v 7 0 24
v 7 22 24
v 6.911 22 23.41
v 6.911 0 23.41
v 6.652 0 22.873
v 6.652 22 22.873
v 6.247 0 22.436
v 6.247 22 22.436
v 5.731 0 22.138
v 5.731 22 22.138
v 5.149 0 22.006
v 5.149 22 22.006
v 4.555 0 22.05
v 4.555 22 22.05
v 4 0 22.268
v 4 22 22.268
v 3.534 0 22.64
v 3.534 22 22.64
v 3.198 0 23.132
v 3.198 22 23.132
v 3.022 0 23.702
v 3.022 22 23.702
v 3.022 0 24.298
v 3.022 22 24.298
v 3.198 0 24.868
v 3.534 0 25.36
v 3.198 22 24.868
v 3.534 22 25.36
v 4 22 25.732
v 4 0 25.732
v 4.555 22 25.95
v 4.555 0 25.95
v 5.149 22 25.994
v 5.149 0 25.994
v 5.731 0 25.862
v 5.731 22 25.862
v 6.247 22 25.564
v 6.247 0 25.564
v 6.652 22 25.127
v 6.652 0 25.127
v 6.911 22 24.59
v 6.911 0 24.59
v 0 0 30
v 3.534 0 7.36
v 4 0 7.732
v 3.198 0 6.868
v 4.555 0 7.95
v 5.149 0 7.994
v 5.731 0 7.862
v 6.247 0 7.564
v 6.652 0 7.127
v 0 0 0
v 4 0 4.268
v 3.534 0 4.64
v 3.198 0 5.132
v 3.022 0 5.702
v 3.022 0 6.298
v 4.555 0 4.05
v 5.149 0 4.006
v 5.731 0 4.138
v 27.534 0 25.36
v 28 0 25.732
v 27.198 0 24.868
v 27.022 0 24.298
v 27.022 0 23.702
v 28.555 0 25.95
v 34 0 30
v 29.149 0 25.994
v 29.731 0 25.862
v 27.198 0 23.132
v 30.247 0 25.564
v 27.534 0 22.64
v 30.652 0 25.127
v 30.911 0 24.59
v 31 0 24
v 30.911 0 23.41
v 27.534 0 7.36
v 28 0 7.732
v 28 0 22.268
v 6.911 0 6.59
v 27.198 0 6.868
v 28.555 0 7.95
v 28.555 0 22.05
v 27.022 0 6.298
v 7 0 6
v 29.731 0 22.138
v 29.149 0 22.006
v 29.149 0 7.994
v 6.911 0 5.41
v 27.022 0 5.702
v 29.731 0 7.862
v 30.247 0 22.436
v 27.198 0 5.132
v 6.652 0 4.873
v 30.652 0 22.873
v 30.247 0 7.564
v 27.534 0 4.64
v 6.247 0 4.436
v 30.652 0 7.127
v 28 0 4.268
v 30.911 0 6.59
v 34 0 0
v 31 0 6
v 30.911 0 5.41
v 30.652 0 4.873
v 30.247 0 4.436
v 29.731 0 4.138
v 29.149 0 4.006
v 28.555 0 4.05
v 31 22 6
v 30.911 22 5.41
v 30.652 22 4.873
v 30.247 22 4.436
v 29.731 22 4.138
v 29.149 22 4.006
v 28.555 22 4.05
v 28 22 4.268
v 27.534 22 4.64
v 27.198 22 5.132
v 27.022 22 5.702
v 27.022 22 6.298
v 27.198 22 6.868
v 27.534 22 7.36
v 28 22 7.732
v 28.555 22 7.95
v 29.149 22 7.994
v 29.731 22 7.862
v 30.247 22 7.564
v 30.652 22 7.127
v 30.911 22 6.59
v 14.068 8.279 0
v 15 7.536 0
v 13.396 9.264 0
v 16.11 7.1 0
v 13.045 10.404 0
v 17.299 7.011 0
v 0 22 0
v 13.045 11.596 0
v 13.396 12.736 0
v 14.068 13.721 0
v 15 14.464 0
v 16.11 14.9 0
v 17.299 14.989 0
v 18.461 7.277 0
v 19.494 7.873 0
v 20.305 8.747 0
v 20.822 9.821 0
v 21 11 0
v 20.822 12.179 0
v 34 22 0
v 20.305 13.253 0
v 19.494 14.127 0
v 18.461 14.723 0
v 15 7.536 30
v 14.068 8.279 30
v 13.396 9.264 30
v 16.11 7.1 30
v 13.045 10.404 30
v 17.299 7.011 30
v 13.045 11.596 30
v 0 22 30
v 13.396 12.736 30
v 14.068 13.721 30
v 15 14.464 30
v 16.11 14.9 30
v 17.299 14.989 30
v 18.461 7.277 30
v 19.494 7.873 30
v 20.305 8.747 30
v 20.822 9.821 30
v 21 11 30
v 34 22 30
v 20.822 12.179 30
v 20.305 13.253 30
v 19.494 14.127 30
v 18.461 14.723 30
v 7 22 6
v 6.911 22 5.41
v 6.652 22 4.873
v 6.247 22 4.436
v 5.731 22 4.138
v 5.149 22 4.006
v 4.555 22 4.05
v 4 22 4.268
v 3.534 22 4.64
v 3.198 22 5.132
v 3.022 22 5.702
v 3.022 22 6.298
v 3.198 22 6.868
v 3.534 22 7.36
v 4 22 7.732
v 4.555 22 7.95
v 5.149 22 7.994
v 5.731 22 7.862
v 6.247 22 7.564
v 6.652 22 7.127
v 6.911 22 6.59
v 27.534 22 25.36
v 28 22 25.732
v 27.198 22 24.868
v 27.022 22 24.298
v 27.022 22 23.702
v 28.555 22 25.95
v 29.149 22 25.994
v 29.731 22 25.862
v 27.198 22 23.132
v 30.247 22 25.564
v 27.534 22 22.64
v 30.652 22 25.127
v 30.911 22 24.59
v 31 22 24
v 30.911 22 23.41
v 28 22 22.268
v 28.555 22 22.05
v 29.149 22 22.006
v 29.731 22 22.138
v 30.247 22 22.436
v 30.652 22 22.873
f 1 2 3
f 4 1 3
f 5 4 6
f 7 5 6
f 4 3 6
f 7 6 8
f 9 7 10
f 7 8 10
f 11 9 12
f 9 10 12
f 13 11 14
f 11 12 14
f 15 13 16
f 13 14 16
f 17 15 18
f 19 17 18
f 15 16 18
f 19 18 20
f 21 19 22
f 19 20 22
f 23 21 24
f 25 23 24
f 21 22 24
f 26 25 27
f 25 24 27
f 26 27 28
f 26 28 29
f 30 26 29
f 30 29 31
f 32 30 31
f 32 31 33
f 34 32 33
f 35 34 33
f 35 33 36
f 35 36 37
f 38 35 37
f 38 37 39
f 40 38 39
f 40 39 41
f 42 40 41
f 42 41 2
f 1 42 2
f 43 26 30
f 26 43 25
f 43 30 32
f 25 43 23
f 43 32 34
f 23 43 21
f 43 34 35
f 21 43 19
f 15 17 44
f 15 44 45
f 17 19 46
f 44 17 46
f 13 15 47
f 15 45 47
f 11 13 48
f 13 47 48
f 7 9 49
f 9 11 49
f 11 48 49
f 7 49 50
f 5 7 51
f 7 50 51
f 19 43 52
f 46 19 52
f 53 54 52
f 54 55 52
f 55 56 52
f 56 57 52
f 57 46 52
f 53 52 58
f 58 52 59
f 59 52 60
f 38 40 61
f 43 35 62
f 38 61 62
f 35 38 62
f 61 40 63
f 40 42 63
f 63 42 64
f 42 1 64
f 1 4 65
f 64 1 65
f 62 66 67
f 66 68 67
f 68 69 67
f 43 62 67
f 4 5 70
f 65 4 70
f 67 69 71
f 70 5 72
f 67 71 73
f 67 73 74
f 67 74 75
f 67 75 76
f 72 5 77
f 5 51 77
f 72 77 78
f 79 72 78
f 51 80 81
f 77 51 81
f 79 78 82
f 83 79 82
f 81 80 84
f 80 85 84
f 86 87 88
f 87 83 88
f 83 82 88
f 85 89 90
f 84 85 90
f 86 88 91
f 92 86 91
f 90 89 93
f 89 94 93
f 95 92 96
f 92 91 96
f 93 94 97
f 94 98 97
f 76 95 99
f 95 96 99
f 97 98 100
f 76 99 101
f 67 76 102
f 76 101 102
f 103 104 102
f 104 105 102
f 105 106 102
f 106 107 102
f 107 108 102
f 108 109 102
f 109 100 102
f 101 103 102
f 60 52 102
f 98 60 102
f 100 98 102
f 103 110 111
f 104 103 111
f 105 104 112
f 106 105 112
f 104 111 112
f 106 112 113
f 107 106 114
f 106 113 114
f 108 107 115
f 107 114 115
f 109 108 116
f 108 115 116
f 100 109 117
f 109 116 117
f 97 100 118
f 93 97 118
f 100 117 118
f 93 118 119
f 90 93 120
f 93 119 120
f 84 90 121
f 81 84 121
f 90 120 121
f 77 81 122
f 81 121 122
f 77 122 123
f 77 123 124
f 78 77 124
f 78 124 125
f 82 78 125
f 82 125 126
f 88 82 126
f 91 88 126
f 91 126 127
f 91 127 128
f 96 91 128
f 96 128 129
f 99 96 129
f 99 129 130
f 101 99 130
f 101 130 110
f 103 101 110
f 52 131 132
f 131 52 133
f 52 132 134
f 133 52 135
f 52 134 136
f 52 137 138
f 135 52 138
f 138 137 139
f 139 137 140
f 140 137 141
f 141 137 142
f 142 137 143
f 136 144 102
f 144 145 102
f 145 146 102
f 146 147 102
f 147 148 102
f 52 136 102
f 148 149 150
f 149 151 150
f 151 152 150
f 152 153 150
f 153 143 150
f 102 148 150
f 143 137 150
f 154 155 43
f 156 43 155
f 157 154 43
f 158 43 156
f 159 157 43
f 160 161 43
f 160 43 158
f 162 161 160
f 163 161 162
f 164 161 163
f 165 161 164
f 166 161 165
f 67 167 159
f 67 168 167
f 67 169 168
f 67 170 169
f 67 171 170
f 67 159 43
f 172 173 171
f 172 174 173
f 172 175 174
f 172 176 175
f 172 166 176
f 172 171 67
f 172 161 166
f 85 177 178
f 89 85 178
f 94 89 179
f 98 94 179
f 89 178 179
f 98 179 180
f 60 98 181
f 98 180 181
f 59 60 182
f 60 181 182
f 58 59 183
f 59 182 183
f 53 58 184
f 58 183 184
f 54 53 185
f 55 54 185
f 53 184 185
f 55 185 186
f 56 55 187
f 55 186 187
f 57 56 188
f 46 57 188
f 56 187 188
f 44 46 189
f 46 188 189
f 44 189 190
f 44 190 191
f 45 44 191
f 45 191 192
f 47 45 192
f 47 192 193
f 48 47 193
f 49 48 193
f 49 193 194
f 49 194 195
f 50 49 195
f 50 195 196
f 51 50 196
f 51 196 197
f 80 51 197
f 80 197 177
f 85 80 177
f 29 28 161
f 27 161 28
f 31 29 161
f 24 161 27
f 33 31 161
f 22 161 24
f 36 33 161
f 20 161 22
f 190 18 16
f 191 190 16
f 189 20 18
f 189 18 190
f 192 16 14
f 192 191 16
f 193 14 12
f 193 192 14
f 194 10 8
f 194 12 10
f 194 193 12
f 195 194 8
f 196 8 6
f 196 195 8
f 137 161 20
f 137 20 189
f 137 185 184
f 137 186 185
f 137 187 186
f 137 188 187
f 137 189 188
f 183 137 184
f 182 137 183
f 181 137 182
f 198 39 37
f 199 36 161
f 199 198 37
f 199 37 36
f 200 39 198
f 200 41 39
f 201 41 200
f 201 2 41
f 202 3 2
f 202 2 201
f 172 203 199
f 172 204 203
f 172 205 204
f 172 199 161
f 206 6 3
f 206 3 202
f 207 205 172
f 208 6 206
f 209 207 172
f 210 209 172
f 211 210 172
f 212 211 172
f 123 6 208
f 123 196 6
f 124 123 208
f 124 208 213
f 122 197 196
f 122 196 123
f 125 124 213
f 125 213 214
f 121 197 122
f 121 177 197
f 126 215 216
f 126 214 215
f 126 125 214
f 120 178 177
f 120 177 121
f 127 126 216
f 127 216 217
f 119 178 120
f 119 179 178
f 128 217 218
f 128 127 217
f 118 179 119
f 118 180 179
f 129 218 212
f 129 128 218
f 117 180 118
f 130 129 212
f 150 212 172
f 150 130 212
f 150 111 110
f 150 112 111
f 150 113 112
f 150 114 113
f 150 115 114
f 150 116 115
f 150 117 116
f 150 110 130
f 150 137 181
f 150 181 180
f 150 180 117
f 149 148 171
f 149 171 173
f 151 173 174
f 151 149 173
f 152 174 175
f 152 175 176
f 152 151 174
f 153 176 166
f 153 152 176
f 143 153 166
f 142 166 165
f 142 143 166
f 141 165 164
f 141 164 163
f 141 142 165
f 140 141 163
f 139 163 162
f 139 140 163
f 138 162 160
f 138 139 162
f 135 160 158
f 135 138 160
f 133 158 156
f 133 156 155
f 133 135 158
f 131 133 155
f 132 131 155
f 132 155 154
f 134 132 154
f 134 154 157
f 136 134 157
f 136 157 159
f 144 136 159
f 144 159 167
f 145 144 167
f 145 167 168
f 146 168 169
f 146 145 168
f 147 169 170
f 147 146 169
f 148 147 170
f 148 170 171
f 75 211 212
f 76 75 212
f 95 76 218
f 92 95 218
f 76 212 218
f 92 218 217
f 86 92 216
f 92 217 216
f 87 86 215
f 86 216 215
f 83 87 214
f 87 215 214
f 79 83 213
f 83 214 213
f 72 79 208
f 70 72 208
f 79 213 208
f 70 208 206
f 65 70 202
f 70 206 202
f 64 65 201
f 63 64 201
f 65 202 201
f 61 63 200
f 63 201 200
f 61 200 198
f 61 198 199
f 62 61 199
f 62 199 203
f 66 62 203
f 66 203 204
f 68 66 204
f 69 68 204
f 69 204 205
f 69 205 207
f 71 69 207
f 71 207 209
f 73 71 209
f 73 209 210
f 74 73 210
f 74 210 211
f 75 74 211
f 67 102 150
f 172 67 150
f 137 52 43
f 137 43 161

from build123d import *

# Parameters (mm, degrees)
SKETCH1_W           = 34
SKETCH1_H           = 22
SKETCH1_R           = 4
BOSS_EXTRUDE1_DEPTH = 30
SKETCH2_R           = 2
CUT_EXTRUDE1_DEPTH  = 23


with BuildPart() as part:
    # Sketch1 → Boss-Extrude1 (new body)
    with BuildSketch(Plane.XY):
        with Locations((17, 11)):
            Rectangle(SKETCH1_W, SKETCH1_H)
        with Locations((17, 11)):
            Circle(SKETCH1_R, mode=Mode.SUBTRACT)
    extrude(amount=BOSS_EXTRUDE1_DEPTH)

    # Sketch2 → Cut-Extrude1 (cut, through all)
    with BuildSketch(Plane(origin=(0, 22, 0), x_dir=(1, 0, 0), z_dir=(0, 1, 0))):
        with Locations((5, -24)):
            Circle(SKETCH2_R)
        with Locations((5, -6)):
            Circle(SKETCH2_R)
        with Locations((29, -6)):
            Circle(SKETCH2_R)
        with Locations((29, -24)):
            Circle(SKETCH2_R)
    extrude(amount=-CUT_EXTRUDE1_DEPTH, mode=Mode.SUBTRACT)


solid = part.part
